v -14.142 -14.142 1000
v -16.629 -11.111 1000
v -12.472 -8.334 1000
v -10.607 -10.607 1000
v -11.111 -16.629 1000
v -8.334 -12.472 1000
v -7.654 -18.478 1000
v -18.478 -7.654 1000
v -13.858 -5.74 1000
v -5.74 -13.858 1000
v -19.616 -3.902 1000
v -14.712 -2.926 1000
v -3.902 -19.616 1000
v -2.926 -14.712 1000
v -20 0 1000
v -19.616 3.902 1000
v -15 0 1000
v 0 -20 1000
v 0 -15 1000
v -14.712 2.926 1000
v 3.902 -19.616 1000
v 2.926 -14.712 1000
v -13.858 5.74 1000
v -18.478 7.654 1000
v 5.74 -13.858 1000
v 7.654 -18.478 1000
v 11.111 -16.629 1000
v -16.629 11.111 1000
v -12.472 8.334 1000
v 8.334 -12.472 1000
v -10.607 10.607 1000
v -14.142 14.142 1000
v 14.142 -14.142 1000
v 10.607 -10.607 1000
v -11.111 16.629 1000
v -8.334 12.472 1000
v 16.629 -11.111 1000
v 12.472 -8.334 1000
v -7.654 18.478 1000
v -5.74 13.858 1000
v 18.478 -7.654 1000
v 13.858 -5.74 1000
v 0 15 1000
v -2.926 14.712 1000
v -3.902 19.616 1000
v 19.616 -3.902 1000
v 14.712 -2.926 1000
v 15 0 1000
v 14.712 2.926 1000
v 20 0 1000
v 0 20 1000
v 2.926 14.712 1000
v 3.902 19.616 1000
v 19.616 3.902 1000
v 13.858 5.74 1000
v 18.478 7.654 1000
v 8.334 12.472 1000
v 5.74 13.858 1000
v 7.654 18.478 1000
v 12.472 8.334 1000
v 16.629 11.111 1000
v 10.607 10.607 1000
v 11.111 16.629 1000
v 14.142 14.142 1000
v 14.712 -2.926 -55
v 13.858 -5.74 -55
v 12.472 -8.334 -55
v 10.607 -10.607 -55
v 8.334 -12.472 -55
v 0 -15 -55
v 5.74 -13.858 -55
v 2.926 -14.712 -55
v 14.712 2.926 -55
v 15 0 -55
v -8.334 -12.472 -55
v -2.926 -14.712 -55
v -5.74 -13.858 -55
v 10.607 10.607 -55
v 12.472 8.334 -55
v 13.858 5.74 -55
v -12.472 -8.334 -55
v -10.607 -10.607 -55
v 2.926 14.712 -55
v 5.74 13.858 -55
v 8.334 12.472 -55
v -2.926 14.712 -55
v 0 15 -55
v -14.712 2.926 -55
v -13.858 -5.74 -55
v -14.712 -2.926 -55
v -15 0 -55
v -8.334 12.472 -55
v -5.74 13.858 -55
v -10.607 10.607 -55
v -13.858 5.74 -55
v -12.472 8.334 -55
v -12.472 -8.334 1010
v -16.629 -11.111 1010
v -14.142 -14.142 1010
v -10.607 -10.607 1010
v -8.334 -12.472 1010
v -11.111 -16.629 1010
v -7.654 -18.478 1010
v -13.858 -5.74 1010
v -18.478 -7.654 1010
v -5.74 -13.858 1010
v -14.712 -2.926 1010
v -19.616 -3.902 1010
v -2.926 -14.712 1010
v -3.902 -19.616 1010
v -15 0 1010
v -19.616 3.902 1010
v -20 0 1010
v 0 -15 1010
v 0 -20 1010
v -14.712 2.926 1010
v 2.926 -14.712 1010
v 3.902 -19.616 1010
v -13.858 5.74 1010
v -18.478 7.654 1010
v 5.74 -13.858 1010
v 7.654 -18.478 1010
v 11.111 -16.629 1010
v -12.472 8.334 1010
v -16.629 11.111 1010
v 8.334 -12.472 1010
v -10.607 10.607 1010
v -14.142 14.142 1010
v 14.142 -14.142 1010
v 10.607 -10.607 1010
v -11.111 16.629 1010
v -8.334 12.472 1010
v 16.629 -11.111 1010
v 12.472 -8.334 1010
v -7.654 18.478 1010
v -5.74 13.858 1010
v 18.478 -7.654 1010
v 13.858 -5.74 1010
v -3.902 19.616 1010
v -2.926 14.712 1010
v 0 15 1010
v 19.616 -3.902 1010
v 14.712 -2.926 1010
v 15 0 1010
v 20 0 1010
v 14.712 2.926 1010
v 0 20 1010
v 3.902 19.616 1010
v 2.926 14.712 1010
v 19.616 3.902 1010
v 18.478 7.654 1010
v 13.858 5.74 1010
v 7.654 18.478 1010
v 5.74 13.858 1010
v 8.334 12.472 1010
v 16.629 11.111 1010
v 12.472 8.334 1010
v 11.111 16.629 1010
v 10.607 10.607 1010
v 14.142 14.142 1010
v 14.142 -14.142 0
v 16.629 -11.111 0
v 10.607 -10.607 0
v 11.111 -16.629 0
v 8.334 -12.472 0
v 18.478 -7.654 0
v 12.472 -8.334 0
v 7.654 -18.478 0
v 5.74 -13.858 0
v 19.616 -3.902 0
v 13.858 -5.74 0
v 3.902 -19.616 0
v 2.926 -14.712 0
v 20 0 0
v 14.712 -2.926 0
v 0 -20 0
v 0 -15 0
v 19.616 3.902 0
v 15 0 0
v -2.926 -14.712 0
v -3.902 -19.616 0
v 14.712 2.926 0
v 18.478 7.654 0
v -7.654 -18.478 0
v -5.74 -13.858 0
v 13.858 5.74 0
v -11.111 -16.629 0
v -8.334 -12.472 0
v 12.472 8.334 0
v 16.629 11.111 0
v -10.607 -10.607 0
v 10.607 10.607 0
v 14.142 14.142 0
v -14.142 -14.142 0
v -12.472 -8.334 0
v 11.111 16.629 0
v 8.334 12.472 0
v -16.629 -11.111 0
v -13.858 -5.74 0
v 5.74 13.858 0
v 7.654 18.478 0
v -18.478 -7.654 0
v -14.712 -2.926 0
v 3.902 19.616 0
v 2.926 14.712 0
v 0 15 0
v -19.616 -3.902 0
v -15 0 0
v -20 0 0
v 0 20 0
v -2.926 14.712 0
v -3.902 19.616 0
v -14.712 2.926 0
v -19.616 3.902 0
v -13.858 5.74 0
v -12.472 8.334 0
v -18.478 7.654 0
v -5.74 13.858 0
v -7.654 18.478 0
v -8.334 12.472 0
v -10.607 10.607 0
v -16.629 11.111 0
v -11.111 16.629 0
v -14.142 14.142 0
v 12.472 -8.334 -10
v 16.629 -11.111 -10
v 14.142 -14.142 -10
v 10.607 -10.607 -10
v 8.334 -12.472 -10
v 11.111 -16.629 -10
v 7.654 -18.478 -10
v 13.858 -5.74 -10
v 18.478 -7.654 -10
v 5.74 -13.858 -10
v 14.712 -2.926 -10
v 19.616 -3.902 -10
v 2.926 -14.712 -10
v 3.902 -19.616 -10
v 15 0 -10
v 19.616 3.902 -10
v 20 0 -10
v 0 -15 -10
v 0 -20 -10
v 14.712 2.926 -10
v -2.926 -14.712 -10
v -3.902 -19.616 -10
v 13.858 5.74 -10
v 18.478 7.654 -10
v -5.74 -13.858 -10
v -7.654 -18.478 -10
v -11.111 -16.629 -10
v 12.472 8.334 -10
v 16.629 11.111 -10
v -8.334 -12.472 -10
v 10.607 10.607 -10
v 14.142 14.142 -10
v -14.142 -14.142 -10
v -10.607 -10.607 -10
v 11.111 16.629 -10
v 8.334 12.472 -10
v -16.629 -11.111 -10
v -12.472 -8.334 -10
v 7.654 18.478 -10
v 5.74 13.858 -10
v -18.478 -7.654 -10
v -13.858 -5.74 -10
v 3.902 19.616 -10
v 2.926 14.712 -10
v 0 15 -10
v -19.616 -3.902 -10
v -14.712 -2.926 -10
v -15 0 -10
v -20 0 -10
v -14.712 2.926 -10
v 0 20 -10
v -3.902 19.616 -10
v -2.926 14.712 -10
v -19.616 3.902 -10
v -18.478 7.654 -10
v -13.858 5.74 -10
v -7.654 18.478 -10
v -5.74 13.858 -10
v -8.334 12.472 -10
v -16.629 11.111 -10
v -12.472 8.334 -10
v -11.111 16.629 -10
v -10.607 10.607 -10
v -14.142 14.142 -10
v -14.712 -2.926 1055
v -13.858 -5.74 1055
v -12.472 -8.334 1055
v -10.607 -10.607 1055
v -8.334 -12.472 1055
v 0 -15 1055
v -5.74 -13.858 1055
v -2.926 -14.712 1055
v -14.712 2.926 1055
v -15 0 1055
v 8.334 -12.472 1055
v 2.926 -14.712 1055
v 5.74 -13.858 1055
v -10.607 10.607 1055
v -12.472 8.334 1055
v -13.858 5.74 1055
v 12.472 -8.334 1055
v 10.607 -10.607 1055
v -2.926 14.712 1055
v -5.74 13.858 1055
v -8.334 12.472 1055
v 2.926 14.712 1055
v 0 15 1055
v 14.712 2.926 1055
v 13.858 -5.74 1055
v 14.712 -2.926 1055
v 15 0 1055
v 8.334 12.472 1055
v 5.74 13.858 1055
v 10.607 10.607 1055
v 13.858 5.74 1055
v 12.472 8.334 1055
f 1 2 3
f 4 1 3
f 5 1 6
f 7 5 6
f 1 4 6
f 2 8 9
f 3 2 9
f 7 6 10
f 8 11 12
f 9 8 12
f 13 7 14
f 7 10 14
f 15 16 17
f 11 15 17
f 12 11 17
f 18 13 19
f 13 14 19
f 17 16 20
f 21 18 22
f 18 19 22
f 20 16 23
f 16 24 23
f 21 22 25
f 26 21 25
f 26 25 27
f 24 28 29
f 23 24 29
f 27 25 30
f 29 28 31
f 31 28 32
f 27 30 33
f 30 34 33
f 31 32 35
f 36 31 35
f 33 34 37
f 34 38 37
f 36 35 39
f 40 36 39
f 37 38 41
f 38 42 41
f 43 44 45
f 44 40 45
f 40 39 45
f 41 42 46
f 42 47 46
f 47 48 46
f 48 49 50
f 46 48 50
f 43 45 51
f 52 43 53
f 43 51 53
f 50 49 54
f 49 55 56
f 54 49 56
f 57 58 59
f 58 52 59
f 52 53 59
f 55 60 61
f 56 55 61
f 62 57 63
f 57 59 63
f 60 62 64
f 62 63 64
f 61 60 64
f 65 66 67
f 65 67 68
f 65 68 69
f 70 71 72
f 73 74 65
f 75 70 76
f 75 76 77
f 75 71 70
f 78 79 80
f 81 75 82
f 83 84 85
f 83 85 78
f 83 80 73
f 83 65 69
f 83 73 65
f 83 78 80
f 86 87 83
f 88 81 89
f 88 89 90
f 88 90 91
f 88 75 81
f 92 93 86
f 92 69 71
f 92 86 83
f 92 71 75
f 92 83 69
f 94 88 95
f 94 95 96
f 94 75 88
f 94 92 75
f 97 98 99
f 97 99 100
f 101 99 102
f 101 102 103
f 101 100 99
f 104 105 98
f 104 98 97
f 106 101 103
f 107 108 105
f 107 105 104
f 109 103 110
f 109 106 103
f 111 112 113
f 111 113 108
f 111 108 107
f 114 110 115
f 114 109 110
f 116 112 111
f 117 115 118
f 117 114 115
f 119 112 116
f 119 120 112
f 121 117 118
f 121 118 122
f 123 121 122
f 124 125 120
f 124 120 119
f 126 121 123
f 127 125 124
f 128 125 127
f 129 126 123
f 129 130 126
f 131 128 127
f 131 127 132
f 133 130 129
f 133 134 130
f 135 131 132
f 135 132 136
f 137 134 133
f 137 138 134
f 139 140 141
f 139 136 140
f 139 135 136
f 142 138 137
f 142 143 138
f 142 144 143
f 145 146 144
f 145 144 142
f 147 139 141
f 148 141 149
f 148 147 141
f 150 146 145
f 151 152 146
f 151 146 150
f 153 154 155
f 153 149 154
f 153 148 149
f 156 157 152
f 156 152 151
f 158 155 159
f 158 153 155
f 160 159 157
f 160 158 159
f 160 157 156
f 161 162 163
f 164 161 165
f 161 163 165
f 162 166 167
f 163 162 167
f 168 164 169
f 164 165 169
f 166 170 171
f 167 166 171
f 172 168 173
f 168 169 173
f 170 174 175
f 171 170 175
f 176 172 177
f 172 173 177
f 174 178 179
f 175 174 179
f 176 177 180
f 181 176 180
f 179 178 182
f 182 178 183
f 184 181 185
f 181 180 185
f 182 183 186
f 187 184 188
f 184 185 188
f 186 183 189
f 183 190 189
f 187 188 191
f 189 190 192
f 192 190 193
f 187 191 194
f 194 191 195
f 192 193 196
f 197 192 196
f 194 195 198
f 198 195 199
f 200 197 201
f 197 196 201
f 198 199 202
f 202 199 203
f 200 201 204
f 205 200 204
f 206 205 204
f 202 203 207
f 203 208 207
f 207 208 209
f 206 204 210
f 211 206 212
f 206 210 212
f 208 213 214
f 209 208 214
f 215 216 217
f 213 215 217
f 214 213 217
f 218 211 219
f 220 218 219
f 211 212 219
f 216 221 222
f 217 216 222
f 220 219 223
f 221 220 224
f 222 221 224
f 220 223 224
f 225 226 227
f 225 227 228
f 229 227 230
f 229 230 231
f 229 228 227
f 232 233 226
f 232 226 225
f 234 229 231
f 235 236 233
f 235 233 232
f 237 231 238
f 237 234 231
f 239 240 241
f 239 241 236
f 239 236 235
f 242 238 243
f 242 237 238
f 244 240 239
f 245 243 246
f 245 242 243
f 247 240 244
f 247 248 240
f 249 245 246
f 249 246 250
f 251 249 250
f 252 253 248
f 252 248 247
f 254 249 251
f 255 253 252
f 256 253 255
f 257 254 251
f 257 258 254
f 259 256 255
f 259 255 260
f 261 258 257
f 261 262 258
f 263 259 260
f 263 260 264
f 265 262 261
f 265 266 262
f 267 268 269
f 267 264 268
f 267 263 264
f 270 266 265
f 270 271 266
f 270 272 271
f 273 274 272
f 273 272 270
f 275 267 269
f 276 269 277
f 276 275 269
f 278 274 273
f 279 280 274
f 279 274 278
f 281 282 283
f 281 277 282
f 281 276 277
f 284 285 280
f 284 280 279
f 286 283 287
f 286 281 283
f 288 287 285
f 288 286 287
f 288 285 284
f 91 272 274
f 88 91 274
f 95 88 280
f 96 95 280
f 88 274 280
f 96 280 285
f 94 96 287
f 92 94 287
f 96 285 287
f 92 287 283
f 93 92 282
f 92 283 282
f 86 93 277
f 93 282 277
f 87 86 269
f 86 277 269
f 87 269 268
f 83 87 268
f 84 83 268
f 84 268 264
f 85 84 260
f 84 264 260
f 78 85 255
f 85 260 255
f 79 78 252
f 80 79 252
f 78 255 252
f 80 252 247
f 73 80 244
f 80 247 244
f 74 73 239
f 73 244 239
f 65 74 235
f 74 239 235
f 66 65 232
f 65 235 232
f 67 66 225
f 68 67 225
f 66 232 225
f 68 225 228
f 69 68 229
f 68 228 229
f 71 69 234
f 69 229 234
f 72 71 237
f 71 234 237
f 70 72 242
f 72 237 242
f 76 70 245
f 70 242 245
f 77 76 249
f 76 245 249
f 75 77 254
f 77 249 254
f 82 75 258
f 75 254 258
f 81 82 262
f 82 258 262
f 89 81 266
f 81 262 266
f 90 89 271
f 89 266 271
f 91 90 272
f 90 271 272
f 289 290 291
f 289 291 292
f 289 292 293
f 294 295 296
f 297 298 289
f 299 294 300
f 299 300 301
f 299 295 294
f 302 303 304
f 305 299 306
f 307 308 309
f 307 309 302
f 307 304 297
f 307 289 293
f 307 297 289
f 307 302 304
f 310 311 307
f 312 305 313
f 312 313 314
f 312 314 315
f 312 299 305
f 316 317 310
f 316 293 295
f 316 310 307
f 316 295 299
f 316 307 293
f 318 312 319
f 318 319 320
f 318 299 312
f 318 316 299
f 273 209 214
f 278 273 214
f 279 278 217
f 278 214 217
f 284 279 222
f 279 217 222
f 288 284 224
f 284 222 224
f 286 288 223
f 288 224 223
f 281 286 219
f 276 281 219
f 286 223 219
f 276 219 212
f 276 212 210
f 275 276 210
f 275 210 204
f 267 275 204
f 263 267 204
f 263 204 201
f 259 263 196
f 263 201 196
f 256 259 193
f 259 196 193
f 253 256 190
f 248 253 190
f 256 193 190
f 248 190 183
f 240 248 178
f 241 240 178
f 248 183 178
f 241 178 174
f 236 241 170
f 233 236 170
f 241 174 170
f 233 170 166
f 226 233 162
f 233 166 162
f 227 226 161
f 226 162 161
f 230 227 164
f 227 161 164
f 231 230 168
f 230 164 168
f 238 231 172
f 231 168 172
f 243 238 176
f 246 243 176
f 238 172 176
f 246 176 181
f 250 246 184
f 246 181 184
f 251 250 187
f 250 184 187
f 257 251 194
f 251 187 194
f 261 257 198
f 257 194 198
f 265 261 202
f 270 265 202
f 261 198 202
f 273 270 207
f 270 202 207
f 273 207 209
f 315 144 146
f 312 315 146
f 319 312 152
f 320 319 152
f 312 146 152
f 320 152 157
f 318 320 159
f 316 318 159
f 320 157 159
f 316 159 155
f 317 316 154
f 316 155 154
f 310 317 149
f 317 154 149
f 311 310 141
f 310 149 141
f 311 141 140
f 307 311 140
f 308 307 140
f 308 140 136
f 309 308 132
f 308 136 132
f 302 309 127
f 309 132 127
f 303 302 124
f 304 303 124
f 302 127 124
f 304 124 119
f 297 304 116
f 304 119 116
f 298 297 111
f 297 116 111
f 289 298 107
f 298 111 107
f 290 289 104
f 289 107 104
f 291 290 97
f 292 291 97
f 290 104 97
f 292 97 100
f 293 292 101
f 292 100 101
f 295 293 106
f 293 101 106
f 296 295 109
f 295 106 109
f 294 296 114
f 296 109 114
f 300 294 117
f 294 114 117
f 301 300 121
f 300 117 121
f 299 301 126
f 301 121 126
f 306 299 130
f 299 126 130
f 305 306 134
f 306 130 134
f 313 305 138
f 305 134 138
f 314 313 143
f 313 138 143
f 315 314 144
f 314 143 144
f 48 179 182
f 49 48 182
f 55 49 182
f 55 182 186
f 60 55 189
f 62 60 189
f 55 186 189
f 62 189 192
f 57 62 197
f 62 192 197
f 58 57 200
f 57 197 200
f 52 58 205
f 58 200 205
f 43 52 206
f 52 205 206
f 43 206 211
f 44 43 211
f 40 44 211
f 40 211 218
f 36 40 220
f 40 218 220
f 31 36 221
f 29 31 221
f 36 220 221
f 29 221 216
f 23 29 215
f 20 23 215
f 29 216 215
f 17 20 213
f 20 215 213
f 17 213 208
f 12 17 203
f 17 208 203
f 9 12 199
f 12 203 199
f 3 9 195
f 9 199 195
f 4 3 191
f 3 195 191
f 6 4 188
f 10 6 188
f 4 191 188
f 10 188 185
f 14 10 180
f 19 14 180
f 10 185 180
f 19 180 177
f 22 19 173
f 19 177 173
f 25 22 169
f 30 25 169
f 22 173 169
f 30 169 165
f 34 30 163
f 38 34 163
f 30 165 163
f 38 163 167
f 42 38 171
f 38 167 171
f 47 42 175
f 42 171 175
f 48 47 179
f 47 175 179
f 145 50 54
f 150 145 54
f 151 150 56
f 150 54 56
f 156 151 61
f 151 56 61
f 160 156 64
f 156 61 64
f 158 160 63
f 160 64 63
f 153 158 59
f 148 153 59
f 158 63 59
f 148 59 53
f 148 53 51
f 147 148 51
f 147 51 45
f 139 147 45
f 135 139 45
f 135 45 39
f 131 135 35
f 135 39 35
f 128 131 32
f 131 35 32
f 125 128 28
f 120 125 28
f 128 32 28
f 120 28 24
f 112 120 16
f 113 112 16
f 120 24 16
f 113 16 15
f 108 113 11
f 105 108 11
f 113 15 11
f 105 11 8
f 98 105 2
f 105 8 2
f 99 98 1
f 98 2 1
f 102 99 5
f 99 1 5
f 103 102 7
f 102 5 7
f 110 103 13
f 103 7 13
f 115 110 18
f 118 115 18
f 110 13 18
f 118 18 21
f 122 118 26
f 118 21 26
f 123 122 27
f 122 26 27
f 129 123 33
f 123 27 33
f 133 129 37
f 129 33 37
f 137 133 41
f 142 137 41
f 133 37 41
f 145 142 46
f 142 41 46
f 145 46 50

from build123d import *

# Parameters (mm, degrees)
SKETCH1_R           = 15
BOSS_EXTRUDE1_DEPTH = 1000
SKETCH2_R           = 20
BOSS_EXTRUDE2_DEPTH = 10
SKETCH3_R           = 15
BOSS_EXTRUDE3_DEPTH = 45
SKETCH4_R           = 20
BOSS_EXTRUDE4_DEPTH = 10
SKETCH5_R           = 15
BOSS_EXTRUDE5_DEPTH = 45


with BuildPart() as part:
    # Sketch1 → Boss-Extrude1 (new body)
    with BuildSketch(Plane.XY):
        Circle(SKETCH1_R)
    extrude(amount=BOSS_EXTRUDE1_DEPTH)

    # Sketch2 → Boss-Extrude2 (add)
    with BuildSketch(Plane.XY.offset(1000)):
        Circle(SKETCH2_R)
    extrude(amount=BOSS_EXTRUDE2_DEPTH)

    # Sketch3 → Boss-Extrude3 (add)
    with BuildSketch(Plane.XY.offset(1010)):
        Circle(SKETCH3_R)
    extrude(amount=BOSS_EXTRUDE3_DEPTH)

    # Sketch4 → Boss-Extrude4 (add)
    with BuildSketch(Plane(origin=(0, 0, 0), x_dir=(-1, 0, 0), z_dir=(0, 0, -1))):
        Circle(SKETCH4_R)
    extrude(amount=BOSS_EXTRUDE4_DEPTH)

    # Sketch5 → Boss-Extrude5 (add)
    with BuildSketch(Plane(origin=(0, 0, -10), x_dir=(-1, 0, 0), z_dir=(0, 0, -1))):
        Circle(SKETCH5_R)
    extrude(amount=BOSS_EXTRUDE5_DEPTH)


solid = part.part
